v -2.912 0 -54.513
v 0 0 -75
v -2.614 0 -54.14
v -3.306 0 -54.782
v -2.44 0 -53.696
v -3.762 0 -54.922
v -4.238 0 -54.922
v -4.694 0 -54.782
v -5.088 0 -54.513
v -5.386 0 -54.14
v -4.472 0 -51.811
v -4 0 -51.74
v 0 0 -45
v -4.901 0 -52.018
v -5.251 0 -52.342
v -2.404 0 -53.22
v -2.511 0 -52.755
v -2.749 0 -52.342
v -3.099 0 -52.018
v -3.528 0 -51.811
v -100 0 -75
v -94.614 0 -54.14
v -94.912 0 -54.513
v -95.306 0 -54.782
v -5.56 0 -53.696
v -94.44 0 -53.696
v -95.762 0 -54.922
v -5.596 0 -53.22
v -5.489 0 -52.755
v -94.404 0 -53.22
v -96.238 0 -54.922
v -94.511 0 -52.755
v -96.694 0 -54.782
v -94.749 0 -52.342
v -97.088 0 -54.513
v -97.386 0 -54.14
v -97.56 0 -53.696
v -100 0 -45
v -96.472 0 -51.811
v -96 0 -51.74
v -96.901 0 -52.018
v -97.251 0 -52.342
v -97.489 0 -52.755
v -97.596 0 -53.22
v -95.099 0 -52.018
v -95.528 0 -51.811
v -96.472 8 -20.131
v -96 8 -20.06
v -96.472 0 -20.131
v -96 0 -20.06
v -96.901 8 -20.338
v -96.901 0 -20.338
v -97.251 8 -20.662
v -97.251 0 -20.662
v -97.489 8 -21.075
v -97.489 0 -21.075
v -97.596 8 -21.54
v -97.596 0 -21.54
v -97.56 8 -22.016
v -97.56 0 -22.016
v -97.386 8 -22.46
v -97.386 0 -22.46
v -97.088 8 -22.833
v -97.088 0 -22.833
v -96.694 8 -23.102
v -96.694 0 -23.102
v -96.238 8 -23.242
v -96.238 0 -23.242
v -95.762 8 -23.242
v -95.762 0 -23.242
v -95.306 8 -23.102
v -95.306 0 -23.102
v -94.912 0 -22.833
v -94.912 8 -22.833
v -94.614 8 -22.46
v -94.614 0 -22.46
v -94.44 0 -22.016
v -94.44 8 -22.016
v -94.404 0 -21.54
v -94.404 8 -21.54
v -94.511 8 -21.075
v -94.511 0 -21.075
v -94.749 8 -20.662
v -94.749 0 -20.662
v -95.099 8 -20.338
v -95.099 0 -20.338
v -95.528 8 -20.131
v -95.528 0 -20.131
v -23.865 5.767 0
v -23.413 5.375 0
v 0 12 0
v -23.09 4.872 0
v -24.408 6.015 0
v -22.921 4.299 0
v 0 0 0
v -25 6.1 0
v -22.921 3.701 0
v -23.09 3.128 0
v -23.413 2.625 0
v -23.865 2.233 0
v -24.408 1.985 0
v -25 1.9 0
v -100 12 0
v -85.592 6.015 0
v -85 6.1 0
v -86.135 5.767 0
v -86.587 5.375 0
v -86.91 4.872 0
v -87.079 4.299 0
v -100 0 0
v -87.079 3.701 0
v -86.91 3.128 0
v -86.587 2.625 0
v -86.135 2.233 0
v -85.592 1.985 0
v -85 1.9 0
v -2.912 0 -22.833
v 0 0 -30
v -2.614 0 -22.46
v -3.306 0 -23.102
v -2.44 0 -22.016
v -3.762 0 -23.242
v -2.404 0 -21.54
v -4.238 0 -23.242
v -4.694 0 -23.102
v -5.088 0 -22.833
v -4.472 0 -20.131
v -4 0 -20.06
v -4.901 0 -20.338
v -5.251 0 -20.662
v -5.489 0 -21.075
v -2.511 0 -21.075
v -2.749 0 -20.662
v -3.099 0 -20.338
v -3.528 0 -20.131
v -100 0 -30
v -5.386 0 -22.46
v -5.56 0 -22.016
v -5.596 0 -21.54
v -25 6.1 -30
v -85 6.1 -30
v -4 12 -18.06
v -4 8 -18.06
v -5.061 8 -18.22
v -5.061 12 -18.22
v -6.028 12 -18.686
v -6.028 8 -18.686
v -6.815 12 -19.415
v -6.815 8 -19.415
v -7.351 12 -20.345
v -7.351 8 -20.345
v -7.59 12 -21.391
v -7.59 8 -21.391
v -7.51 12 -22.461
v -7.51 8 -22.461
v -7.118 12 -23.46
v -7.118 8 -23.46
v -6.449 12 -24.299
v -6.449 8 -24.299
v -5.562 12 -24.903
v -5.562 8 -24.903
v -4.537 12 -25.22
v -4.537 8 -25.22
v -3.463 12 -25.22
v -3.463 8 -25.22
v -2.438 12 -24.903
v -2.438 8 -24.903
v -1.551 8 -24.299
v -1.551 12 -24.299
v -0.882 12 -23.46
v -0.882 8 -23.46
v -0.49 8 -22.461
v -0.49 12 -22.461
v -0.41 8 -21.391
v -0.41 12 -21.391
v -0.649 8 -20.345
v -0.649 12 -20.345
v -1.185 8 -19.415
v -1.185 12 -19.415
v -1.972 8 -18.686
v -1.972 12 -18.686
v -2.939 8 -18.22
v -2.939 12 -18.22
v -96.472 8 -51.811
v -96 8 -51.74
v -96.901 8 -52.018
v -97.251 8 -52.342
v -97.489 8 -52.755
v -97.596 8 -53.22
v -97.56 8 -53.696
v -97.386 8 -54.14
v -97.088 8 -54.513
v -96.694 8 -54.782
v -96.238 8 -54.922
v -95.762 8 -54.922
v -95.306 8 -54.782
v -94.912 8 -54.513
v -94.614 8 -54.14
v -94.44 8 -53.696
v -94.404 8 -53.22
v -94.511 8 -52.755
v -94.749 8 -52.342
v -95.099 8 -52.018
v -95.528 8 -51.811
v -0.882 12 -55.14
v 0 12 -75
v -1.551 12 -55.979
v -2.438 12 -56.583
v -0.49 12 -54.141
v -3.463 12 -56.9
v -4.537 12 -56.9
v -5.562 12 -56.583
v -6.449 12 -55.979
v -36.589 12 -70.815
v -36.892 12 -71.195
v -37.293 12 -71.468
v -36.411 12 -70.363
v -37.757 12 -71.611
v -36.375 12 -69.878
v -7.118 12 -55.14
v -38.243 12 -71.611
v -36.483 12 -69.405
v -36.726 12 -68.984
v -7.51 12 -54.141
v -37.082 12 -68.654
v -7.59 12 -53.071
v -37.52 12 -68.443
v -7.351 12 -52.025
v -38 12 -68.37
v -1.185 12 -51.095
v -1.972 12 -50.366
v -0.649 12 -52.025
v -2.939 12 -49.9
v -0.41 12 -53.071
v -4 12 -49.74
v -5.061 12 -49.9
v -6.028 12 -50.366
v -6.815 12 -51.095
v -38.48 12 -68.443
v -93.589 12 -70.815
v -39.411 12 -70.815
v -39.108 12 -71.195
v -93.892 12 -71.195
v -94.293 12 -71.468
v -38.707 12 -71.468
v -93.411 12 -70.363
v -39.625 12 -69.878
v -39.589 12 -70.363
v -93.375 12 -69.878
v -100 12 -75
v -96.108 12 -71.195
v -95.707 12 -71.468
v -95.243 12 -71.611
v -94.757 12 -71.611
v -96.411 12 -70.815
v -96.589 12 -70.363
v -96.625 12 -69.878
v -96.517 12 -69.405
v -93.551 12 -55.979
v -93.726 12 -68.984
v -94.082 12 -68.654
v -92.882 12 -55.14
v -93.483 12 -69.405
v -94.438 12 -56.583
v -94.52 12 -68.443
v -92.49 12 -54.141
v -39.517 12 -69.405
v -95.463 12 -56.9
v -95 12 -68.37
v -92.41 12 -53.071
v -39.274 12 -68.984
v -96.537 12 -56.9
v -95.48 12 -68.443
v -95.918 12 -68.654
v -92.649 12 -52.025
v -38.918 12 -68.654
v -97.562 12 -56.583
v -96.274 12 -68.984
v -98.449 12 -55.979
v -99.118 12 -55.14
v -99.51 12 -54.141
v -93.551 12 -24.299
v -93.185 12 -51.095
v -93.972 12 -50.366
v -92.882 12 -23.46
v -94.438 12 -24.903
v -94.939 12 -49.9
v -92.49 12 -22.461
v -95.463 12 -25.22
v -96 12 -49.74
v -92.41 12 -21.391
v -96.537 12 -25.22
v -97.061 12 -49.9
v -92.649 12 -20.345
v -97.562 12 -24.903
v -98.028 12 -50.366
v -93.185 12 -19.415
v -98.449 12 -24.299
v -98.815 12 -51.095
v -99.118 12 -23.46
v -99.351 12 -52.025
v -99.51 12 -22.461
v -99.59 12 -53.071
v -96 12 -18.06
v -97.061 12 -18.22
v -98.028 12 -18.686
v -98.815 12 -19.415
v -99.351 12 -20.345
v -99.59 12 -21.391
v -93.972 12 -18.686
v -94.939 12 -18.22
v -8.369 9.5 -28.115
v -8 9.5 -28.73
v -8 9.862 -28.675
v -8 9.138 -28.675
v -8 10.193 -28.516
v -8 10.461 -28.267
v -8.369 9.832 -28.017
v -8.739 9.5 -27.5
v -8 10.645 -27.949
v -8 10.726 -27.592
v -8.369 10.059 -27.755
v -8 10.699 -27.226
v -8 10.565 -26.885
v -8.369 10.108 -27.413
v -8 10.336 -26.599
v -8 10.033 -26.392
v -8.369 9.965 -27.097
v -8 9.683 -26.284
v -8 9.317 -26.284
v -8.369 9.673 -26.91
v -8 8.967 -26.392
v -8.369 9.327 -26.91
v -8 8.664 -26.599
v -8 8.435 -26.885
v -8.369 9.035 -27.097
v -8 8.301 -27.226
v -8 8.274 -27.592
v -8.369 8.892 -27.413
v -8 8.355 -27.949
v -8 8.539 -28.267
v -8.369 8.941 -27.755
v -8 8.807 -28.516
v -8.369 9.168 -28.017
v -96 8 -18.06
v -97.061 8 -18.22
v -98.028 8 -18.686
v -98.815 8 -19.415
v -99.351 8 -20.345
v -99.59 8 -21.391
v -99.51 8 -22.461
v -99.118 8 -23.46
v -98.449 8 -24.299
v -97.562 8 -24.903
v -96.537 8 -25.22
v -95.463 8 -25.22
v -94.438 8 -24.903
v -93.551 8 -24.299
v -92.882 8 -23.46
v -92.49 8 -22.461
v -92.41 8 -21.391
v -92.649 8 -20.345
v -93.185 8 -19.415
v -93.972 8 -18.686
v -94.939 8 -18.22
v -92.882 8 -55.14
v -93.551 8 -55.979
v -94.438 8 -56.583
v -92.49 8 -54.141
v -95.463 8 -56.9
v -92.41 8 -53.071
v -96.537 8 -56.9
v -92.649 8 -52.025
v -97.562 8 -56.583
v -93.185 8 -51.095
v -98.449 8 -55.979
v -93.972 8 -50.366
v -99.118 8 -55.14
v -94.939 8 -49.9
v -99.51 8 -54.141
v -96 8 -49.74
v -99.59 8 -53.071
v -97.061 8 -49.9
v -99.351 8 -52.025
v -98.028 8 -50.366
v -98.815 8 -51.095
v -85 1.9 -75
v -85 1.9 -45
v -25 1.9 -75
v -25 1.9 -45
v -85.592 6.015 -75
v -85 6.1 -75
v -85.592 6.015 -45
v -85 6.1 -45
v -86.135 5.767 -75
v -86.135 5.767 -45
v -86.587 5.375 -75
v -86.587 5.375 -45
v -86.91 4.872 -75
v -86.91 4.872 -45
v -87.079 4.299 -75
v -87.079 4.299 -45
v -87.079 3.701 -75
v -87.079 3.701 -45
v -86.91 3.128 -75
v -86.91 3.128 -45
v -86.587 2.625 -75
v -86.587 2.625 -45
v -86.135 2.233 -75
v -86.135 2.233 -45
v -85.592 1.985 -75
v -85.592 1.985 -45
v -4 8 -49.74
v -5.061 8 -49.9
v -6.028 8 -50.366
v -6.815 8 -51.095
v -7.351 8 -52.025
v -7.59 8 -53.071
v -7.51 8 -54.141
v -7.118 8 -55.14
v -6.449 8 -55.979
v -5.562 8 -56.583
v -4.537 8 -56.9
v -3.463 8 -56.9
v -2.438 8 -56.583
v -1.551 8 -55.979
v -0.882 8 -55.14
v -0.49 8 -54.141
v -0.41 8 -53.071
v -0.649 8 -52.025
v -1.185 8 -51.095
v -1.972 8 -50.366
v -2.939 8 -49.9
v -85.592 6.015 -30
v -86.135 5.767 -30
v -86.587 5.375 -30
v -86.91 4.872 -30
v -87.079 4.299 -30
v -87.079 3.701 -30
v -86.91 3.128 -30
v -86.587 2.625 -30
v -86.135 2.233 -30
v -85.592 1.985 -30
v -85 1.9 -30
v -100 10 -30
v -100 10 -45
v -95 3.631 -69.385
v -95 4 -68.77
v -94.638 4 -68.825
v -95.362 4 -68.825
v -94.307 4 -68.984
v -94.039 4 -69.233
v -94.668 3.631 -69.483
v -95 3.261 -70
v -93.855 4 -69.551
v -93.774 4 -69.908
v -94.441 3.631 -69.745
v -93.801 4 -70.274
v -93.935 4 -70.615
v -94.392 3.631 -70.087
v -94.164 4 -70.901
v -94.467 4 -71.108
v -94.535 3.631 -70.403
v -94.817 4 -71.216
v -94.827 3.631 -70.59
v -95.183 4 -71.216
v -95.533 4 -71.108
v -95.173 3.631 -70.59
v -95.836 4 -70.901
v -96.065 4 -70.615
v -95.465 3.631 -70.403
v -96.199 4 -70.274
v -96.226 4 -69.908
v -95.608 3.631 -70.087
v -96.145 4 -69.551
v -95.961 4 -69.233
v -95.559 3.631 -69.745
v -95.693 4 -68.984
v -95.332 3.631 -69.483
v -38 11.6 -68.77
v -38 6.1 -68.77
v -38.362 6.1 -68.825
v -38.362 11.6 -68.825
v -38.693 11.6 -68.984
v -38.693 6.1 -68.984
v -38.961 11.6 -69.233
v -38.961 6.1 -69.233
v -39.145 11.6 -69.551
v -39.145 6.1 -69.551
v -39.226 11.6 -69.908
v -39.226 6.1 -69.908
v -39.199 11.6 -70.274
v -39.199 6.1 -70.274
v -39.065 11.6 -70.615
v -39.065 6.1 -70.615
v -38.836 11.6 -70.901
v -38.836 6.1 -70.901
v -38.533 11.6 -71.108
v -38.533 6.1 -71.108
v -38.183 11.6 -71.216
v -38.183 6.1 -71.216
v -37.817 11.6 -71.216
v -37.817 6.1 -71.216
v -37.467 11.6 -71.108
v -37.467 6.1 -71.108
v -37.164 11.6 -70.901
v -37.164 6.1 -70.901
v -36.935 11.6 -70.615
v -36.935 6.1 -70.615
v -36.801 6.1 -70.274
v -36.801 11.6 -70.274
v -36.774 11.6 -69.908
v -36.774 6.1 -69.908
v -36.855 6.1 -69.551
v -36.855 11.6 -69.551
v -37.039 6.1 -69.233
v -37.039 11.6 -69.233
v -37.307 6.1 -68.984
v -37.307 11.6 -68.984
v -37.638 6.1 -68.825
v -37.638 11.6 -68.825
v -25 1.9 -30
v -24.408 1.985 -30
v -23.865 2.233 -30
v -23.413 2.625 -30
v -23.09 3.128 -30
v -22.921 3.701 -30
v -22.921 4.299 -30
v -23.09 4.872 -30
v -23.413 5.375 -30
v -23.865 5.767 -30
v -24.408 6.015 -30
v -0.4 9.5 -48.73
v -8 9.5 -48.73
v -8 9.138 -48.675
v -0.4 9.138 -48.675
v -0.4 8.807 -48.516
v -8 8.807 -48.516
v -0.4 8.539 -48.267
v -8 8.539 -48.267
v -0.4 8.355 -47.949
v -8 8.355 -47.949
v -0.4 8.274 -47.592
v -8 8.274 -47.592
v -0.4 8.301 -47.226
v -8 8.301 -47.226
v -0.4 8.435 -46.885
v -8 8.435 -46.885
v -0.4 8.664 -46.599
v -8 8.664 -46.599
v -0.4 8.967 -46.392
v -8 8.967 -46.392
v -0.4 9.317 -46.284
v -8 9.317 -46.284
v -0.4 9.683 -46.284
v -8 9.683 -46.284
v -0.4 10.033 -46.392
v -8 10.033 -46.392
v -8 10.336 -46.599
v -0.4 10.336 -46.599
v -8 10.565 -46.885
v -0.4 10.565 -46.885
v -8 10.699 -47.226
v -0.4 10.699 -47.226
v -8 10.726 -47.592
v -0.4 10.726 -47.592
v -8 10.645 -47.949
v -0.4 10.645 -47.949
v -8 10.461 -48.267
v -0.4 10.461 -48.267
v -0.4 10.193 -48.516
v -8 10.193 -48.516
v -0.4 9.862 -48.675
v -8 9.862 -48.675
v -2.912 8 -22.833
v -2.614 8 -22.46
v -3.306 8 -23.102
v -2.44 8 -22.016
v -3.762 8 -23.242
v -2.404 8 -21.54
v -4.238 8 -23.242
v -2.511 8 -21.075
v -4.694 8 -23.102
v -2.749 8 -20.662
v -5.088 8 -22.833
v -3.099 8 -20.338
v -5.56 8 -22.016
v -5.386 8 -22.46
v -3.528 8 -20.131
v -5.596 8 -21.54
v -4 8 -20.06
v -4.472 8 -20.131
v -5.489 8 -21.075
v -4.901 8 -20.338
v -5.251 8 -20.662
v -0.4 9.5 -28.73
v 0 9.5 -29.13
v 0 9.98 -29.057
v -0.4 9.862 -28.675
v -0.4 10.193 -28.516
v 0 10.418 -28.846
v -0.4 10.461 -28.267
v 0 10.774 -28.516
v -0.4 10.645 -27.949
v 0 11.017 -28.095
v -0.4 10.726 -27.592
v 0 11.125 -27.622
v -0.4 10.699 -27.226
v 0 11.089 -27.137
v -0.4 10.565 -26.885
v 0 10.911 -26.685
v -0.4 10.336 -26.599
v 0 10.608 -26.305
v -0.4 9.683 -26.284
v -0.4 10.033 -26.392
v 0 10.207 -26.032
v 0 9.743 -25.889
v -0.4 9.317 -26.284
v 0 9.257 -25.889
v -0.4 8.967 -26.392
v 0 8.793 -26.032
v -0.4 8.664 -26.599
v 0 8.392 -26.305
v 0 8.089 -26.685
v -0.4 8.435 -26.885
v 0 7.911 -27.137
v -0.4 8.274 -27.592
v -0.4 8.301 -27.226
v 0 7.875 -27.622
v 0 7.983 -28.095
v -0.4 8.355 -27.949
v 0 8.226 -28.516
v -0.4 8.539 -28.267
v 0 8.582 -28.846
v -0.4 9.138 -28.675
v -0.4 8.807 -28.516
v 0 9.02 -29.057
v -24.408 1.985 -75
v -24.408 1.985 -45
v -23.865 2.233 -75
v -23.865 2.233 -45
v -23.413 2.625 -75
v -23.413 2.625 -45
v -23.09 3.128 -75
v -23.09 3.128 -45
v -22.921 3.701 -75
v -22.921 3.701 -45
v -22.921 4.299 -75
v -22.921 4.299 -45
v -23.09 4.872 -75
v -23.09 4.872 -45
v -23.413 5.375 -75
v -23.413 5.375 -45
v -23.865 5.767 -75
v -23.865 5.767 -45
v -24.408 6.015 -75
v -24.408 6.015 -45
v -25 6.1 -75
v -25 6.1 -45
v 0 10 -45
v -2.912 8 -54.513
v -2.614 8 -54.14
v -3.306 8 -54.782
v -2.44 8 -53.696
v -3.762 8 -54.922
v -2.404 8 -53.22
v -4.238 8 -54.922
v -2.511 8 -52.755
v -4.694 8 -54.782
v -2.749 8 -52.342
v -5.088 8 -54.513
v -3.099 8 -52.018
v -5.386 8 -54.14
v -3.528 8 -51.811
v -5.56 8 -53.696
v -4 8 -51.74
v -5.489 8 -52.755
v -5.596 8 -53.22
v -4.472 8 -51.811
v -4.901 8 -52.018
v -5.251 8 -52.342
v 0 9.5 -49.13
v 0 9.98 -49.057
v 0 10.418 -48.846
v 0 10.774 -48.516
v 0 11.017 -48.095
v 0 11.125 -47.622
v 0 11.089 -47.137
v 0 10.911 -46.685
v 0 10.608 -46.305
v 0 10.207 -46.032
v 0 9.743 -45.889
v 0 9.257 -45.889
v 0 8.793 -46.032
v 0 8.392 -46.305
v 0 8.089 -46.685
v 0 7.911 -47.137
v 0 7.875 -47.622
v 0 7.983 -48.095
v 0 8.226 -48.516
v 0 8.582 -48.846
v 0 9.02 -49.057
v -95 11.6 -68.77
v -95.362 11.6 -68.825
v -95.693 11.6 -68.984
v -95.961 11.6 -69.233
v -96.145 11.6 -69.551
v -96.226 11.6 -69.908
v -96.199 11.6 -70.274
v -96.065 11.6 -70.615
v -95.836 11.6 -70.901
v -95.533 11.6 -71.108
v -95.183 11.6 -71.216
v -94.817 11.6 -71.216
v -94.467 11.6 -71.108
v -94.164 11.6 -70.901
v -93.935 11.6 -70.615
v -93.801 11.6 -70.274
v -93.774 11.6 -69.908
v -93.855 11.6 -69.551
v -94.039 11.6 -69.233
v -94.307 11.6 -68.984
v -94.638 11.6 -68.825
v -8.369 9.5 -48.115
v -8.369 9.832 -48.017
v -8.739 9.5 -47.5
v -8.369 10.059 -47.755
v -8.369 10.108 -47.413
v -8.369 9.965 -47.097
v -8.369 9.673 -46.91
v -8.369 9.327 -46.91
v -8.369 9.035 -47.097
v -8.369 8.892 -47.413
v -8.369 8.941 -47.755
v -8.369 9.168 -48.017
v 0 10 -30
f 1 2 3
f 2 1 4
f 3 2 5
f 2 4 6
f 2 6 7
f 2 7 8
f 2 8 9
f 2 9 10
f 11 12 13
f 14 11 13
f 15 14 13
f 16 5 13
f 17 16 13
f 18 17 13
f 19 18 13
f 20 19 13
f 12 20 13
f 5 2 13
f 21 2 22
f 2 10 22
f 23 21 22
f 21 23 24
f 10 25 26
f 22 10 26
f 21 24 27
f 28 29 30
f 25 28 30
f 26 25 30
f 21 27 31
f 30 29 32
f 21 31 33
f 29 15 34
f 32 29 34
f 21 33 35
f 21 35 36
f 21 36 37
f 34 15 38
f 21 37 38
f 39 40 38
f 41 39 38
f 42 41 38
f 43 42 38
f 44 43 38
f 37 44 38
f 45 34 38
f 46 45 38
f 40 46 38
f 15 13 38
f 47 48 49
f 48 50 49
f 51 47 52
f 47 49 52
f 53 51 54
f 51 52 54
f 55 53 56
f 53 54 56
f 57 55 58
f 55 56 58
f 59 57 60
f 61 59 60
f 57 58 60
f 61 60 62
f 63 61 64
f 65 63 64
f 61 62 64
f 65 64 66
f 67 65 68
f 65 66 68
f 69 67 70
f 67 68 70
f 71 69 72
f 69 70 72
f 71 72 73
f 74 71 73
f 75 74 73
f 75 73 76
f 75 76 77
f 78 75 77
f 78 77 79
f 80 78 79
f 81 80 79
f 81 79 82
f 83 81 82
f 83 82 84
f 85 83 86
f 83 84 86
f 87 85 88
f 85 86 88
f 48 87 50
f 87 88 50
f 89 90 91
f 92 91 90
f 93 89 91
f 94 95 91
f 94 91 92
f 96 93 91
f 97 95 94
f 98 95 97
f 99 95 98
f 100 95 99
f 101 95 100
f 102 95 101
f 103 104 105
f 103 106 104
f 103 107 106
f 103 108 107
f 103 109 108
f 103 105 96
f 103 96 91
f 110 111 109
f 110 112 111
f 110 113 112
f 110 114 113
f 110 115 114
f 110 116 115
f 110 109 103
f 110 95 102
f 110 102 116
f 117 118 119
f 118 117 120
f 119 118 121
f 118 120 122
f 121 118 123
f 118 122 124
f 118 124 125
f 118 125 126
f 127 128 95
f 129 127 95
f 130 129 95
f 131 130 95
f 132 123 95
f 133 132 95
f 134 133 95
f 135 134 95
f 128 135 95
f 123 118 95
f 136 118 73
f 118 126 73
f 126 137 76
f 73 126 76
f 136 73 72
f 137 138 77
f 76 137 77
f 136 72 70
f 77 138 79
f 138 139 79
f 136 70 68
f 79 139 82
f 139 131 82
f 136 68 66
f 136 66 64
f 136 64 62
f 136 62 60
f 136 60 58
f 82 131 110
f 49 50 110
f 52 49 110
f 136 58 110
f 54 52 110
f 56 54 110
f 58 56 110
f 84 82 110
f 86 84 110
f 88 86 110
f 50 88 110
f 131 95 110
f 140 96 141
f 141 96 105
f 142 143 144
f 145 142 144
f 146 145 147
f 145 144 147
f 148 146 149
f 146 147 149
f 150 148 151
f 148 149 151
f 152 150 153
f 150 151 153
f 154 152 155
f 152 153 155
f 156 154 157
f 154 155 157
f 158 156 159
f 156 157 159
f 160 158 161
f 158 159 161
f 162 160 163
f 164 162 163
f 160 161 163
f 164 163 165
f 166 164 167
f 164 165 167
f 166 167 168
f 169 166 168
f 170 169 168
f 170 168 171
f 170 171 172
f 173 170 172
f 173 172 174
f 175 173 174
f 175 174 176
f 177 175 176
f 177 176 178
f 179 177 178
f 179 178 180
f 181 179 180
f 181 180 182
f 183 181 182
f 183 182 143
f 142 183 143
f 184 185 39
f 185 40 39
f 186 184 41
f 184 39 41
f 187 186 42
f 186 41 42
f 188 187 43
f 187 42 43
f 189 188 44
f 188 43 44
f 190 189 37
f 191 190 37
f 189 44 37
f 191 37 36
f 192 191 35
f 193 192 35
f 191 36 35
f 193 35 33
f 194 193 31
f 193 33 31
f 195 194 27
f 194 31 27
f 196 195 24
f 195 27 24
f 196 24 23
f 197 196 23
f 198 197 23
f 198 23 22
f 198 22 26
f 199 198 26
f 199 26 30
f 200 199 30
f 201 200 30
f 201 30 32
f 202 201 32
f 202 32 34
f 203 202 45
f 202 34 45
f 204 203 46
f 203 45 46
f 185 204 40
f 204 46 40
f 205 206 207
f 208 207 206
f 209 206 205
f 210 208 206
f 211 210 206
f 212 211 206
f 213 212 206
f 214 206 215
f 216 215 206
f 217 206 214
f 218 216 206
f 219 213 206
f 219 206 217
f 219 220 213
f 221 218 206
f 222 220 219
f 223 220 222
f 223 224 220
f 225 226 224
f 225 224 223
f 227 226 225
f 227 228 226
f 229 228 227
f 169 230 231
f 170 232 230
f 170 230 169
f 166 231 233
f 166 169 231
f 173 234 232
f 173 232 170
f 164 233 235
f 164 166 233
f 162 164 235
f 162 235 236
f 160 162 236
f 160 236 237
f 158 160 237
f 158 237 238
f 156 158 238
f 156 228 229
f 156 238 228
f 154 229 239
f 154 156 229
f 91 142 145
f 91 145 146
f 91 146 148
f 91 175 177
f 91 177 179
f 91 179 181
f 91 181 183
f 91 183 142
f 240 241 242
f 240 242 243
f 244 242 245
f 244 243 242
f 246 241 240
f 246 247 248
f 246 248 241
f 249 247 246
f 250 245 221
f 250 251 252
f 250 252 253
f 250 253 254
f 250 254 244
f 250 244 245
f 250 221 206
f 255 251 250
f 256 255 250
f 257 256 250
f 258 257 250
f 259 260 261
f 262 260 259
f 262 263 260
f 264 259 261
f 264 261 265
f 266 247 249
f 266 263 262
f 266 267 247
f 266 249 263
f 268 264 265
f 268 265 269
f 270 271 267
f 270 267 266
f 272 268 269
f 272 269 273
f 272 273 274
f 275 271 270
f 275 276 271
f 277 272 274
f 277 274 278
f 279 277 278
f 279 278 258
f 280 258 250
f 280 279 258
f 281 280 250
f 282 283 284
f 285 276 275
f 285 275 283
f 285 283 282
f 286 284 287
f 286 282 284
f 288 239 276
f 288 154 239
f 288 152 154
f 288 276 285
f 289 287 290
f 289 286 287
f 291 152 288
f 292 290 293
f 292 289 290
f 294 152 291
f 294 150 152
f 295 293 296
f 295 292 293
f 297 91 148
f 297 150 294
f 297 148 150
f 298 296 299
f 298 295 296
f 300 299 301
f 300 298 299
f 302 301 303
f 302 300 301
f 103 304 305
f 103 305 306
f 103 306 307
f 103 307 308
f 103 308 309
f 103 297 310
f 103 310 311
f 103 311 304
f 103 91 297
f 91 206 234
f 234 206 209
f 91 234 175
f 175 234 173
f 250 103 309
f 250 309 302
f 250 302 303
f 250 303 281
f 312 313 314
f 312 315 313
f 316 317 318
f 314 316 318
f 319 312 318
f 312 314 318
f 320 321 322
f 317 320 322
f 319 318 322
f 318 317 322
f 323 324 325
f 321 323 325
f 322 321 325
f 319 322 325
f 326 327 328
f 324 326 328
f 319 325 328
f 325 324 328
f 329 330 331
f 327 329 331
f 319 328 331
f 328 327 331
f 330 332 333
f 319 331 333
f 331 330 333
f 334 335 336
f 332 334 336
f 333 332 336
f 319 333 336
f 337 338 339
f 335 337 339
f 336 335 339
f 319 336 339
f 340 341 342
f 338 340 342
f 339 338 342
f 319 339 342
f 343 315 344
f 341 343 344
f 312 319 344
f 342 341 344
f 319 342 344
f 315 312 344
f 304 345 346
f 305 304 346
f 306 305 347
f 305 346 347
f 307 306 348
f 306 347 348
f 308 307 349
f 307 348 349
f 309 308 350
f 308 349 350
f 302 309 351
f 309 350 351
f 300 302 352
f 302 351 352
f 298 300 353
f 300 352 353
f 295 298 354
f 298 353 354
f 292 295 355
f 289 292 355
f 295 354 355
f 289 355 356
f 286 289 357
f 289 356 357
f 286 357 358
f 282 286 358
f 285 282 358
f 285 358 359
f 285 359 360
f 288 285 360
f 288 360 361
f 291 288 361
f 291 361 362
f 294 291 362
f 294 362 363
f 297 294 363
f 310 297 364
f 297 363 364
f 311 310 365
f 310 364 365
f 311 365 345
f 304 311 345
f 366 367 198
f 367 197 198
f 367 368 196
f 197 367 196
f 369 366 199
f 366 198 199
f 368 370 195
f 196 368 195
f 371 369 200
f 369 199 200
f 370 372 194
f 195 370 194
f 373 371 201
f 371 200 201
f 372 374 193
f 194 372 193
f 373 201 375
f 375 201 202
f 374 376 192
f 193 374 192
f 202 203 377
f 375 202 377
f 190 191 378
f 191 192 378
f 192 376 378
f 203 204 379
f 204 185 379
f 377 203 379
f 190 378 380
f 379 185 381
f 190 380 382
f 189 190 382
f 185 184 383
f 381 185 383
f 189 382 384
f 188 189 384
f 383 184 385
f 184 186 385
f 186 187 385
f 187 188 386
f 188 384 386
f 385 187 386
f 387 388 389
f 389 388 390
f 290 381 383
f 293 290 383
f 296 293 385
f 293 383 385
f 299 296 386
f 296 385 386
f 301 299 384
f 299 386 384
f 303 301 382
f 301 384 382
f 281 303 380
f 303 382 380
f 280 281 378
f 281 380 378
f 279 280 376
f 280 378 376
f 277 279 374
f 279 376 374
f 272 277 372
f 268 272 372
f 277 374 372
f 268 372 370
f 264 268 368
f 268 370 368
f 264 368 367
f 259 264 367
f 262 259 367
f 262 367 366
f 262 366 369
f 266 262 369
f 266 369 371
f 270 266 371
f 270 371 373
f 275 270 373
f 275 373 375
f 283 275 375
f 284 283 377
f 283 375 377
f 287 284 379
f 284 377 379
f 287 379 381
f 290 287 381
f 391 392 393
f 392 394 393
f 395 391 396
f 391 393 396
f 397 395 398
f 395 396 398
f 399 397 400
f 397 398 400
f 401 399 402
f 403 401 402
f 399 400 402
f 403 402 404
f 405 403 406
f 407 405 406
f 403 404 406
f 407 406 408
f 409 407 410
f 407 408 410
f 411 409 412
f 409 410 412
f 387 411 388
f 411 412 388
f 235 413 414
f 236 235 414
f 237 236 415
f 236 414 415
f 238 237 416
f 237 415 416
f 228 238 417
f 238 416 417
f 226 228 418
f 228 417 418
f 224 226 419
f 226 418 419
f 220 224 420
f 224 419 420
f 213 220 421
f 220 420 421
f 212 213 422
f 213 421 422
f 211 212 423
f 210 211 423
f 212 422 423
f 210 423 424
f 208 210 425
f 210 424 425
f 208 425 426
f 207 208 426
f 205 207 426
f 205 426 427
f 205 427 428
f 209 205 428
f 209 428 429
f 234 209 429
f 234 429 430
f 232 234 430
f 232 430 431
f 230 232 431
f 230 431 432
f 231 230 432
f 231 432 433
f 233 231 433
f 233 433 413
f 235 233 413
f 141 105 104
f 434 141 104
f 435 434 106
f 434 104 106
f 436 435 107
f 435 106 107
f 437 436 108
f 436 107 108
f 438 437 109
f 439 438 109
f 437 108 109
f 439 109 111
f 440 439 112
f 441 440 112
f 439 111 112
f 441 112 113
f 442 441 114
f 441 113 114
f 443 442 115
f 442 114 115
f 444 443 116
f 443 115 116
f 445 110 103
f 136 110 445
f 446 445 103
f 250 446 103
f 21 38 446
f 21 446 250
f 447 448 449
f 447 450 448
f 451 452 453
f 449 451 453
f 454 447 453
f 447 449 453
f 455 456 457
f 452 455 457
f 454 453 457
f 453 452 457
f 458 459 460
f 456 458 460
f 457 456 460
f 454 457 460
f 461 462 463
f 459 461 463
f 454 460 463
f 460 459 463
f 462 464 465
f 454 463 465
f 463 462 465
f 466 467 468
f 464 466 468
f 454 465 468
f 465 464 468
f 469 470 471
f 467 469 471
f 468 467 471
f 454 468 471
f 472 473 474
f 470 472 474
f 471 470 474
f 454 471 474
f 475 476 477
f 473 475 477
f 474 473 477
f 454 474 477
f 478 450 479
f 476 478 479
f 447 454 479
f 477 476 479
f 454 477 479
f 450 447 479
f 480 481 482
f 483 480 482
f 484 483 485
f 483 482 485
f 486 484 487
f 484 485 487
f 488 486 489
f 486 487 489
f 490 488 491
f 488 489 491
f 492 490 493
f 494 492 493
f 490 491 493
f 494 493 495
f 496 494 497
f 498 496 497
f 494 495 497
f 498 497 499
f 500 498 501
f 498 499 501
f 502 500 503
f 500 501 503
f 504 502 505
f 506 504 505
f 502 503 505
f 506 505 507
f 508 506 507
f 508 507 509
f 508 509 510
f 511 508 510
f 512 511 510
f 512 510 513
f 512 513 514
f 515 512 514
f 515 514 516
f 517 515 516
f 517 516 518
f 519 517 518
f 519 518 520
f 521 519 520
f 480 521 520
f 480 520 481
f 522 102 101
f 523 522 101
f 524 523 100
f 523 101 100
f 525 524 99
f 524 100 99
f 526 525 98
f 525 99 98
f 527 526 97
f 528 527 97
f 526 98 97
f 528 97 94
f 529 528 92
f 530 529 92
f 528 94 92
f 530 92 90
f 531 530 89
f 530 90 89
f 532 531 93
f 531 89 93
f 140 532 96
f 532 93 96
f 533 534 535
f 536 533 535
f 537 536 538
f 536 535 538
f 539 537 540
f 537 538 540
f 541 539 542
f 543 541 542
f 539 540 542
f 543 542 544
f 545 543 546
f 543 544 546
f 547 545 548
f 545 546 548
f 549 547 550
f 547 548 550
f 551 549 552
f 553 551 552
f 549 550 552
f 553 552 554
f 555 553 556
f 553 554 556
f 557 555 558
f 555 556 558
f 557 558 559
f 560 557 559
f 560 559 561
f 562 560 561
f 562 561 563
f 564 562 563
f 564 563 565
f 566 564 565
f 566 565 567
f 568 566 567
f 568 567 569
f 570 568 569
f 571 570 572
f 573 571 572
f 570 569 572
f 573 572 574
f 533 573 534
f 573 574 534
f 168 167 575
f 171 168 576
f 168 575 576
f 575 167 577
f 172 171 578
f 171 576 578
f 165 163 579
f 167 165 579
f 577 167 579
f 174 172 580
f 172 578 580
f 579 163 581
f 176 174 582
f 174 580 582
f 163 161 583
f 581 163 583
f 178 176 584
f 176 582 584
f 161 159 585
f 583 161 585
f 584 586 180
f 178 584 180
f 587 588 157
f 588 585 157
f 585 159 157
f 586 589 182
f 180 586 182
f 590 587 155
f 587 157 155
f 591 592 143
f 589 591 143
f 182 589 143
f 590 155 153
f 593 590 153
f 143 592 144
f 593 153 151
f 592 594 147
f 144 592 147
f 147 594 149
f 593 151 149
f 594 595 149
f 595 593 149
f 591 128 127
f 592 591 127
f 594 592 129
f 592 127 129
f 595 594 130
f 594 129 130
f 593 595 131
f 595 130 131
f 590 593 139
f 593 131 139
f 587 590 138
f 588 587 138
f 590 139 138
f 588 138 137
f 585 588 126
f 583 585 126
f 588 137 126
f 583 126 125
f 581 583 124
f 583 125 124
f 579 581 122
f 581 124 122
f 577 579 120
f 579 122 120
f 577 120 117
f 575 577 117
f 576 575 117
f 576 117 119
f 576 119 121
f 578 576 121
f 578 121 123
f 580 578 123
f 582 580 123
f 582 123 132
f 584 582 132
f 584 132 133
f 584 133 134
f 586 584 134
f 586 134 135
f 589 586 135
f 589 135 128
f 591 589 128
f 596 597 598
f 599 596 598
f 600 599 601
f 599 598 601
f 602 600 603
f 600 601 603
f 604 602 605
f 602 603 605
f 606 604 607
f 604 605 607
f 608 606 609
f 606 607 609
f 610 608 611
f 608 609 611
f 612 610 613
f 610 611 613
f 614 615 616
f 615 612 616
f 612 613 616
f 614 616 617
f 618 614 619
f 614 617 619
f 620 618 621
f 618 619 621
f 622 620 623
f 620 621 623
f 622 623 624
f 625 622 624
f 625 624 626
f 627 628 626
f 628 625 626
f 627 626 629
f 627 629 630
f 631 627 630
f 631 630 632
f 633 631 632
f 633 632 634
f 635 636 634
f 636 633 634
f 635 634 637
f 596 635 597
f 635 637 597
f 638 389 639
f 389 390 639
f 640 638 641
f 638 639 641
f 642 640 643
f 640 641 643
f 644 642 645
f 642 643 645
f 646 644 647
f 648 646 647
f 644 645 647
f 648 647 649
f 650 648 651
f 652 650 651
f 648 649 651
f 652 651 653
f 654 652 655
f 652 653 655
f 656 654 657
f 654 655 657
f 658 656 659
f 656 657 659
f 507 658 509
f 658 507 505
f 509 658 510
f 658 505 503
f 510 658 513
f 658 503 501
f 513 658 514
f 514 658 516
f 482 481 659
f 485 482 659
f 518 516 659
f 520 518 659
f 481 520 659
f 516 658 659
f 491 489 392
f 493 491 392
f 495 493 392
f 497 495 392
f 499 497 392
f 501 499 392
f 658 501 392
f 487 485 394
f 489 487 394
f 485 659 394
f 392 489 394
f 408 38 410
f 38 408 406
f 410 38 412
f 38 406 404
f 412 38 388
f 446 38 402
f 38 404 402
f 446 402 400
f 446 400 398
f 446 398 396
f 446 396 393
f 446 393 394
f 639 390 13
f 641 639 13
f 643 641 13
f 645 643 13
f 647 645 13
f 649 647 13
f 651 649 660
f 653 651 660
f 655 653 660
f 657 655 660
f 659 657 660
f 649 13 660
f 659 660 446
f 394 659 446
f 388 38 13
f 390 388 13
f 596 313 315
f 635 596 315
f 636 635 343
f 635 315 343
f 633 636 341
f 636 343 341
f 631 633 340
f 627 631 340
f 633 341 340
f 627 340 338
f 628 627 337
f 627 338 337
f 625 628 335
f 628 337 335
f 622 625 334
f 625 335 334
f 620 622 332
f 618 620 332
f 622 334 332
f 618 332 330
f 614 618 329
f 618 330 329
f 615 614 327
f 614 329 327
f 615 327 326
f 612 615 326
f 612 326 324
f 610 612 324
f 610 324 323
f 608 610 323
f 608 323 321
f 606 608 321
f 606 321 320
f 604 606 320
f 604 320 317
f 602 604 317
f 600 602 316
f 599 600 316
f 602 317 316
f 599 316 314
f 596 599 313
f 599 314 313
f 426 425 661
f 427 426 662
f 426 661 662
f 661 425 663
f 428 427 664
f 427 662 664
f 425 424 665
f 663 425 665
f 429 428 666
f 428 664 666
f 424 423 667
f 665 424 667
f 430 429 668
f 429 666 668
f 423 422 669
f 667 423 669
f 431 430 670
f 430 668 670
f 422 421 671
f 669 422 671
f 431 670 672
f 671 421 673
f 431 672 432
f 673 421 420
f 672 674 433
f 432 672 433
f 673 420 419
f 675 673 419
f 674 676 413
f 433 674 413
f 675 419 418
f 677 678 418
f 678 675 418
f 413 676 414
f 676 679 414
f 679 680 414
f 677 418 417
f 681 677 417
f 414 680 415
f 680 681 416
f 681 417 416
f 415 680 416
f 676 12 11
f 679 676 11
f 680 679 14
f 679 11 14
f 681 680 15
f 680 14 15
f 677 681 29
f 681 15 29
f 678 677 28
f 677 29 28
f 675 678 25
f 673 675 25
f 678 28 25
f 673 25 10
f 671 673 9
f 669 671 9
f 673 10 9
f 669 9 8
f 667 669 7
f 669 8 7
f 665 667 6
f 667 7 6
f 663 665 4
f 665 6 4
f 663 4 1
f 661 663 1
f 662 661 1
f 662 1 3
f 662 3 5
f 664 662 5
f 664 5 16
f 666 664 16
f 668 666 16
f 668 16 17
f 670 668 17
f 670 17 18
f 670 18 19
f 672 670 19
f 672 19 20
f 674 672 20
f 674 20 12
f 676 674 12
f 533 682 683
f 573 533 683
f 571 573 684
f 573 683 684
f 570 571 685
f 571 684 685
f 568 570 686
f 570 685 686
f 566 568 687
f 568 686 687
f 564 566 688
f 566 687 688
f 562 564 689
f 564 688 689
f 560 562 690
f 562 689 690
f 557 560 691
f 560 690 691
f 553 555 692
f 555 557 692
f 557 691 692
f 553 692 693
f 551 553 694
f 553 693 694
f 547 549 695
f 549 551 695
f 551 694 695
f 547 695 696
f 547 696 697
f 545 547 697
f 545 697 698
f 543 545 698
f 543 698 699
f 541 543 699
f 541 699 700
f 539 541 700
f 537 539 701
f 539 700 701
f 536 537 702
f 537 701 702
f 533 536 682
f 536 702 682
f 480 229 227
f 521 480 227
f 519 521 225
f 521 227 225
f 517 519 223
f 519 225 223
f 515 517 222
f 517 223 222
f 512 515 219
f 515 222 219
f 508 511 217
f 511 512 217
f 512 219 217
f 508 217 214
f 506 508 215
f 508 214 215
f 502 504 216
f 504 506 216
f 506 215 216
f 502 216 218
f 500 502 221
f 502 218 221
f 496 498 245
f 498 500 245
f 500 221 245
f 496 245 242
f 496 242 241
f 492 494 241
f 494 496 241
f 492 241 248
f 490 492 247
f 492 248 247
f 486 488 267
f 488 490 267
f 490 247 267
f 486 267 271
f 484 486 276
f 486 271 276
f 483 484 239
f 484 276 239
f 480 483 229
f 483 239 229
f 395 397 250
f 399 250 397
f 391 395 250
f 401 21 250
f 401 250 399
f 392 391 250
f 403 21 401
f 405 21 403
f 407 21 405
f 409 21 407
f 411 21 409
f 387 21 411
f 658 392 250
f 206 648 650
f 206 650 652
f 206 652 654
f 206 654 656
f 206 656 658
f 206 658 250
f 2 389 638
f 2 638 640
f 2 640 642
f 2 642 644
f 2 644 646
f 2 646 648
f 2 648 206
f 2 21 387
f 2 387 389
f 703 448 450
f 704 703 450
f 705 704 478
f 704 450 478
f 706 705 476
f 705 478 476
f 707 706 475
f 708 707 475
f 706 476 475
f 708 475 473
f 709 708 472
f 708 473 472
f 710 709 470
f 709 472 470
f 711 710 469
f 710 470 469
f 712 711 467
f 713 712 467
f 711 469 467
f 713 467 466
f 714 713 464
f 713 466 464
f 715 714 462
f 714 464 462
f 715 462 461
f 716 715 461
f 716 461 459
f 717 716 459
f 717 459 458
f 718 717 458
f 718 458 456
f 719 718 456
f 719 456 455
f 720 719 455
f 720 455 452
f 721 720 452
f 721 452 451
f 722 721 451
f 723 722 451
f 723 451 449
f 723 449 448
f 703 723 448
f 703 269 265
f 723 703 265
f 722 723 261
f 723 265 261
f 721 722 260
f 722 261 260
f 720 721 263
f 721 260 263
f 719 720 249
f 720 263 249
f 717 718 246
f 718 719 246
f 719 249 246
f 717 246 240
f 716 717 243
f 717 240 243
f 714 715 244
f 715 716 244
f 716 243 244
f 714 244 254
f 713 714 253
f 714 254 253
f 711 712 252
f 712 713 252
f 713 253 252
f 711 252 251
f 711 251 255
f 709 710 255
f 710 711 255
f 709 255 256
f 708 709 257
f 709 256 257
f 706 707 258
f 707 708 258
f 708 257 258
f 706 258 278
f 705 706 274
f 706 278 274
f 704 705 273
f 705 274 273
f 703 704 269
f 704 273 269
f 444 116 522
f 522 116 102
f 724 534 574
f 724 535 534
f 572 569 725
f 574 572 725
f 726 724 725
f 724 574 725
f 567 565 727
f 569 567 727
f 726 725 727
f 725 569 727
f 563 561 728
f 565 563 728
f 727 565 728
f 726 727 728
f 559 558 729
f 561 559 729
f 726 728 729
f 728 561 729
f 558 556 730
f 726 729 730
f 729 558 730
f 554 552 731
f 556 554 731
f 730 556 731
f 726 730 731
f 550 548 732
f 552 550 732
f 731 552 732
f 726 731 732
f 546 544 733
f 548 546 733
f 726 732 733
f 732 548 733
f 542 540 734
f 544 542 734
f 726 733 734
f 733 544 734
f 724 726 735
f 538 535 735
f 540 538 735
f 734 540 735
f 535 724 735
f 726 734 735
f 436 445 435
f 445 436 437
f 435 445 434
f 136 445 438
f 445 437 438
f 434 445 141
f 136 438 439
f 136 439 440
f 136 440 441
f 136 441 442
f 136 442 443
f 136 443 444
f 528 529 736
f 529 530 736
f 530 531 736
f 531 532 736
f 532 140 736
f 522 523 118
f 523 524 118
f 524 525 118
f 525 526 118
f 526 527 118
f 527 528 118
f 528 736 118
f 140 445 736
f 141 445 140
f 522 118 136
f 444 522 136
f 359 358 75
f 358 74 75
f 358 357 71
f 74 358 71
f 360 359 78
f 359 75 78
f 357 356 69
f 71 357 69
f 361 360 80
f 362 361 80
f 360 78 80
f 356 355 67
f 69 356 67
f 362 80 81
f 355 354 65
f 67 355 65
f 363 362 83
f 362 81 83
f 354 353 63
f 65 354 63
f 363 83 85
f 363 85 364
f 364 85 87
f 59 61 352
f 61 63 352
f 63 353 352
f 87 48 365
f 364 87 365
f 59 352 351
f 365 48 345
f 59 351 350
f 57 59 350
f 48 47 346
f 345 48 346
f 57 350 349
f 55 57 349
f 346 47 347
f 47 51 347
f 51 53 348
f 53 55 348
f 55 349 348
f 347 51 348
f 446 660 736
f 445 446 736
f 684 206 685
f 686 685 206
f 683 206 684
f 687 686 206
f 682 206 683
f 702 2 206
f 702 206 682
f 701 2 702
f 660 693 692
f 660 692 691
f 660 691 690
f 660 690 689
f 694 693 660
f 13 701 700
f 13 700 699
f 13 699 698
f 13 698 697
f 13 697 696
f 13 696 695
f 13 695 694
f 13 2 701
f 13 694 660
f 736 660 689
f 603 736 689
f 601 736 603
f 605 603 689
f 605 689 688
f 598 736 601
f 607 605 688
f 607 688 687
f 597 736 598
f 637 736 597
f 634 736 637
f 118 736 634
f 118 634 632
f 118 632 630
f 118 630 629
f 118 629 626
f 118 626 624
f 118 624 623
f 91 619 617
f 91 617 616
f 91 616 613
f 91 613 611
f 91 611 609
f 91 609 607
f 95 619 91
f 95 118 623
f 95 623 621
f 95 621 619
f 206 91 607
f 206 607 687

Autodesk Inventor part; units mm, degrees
ref_plane "YZ Plane" through (0, 0, 0) normal (1, 0, 0) x (0, 1, 0)
ref_plane "XZ Plane" through (0, 0, 0) normal (0, 1, 0) x (-1, 0, 0)
ref_plane "XY Plane" through (0, 0, 0) normal (0, 0, 1) x (1, 0, 0)
sketch "Sketch1" plane through (0, 0, 0) normal (0, 1, 0) x (-1, 0, 0)
  line L0 (0, 0) -> (100, 0)
  line L1 (100, 0) -> (100, -75)
  line L2 (100, -75) -> (0, -75)
  line L3 (0, -75) -> (0, 0)
  line L4 (100, -75) -> (100, 0)
  dimension "d0" = 100
  dimension "d1" = 75
extrude "Extrusion1" add sketch "Sketch1" along normal blind 12
sketch "Sketch2" plane through (0, 0, 0) normal (1, 0, 0) x (0, 0, -1)
  line L0 (0, 0) -> (75, 0) projected
  line L1 (30, 0) -> (45, 0)
  line L2 (45, 0) -> (45, 10)
  line L3 (45, 10) -> (30, 10)
  line L4 (30, 10) -> (30, 0)
  line L5 (75, 0) -> (75, 12) projected
  line L6 (0, 0) -> (0, 12) projected
  point P0 (0, 6)
  point P1 (30, 5)
  point P2 (45, 0)
  dimension "d12" = 15
  dimension "d13" = 75
  dimension "d14" = 30
  dimension "d15" = 10
extrude "Extrusion2" cut sketch "Sketch2" against normal through all
sketch "Sketch3" plane through (-100, 0, 0) normal (0, 0, 1) x (1, 0, 0)
  line L0 (0, 0) -> (0, 12) projected
  line L1 (15, 4) -> (75, 4) construction
  line L2 (15, 1.9) -> (75, 1.9)
  line L3 (75, 6.1) -> (15, 6.1)
  arc A0 (15, 6.1) -> (15, 1.9) centre (15, 4) ccw
  arc A1 (75, 1.9) -> (75, 6.1) centre (75, 4) ccw
  line L4 (0, 0) -> (100, 0) projected
  line L5 (0, 12) -> (100, 12) projected
  point P0 (0, 6)
  point P1 (45, 4)
  point P2 (0, 6)
  dimension "d20" = 4.2
  dimension "d21" = 15
  dimension "d22" = 4
  dimension "d23" = 12
  dimension "d60" = 60
extrude "Extrusion3" cut sketch "Sketch3" against normal through all
sketch "Sketch4" plane through (0, 0, -75) normal (1, 0, 0) x (0, 0, -1)
  circle A0 centre (-27.5, 9.5) radius 1.5
  line L0 (-30, 0) -> (0, 0) projected
  line L1 (-30, 10) -> (-30, 0) projected
  line L2 (-30, 0) -> (-45, 0) construction
  line L3 (-45, 0) -> (-37.5, 0) construction
  line L4 (-37.5, 0) -> (-37.5, -2.8944) construction
  circle A1 centre (-47.5, 9.5) radius 1.5
  line L5 (-75, 12) -> (0, 12) projected
  point P0 (-75, 0)
  dimension "d26" = 3
  dimension "d29" = 2.5
  dimension "d30" = 2.5
hole "Hole1" at (0, 9.5, -27.5) at (0, 9.5, -47.5) direction (-1, 0, 0) diameter 2.459 depth 8 tip angle 118 thread size "M3x0.5" class "6H" standard "ISO Metric profile"
chamfer "Chamfer2" distance 0.4 angle 45 2 edges at (0, 9.5, -46.2705) (0, 9.5, -26.2705)
sketch "Sketch6" plane through (0, 12, 0) normal (0, 1, 0) x (1, 0, 0)
  circle A0 centre (-96, 21.66) radius 1
  line L0 (-100, 0) -> (0, 0) projected
  line L1 (-100, 75) -> (-100, 0) projected
  line L2 (-100, 37.5) -> (-44.6159, 37.5) construction
  line L3 (-50, 0) -> (-50, 87.3463) construction
  circle A1 centre (-4, 21.66) radius 1
  circle A2 centre (-96, 53.34) radius 1
  circle A3 centre (-4, 53.34) radius 1
  point P0 (-96, 21.66)
  point P1 (-4, 21.66)
  point P2 (-4, 21.66)
  point P3 (-96, 53.34)
  point P4 (-4, 53.34)
  point P5 (-4, 53.34)
  dimension "d49" = 2
  dimension "d50" = 21.66
  dimension "d52" = 4
hole "Hole3" at (-96, 12, -21.66) at (-96, 12, -53.34) at (-4, 12, -53.34) at (-4, 12, -21.66) direction (0, -1, 0) diameter 3.2 depth 13 tip angle 118 counterbore diameter 7.2 counterbore depth 4
sketch "Sketch8" plane through (0, 12, 0) normal (0, 1, 0) x (1, 0, 0)
  circle A0 centre (-95, 70) radius 2
  line L0 (0, 0) -> (0, 75) construction
  line L1 (0, 37.5) -> (-49.0535, 37.5) construction
  line L2 (-100, 75) -> (-100, 0) projected
  line L3 (0, 75) -> (-100, 75) projected
  line L4 (-66.5, 46.7026) -> (-66.5, 27.8899) construction
  circle A1 centre (-38, 70) radius 2
  point P0 (-38, 70)
  dimension "d61" = 4
  dimension "d75" = 5
  dimension "d76" = 57
  dimension "d77" = 5
hole "Hole4" at (-95, 12, -70) at (-38, 12, -70) direction (0, -1, 0) diameter 2.459 depth 8 tip angle 118 thread size "M3x0.5" class "6H" standard "ISO Metric profile"
chamfer "Chamfer3" distance 0.4 angle 45 2 edges at (-95, 12, -71.2295) (-38, 12, -71.2295)
equation "\"d22\" = 0.333333 * d23"
equation "\"d29\" = d28"
equation "\"d28\" = 2.5"
properties part number "blat" material "Stainless Steel, Austenitic"
